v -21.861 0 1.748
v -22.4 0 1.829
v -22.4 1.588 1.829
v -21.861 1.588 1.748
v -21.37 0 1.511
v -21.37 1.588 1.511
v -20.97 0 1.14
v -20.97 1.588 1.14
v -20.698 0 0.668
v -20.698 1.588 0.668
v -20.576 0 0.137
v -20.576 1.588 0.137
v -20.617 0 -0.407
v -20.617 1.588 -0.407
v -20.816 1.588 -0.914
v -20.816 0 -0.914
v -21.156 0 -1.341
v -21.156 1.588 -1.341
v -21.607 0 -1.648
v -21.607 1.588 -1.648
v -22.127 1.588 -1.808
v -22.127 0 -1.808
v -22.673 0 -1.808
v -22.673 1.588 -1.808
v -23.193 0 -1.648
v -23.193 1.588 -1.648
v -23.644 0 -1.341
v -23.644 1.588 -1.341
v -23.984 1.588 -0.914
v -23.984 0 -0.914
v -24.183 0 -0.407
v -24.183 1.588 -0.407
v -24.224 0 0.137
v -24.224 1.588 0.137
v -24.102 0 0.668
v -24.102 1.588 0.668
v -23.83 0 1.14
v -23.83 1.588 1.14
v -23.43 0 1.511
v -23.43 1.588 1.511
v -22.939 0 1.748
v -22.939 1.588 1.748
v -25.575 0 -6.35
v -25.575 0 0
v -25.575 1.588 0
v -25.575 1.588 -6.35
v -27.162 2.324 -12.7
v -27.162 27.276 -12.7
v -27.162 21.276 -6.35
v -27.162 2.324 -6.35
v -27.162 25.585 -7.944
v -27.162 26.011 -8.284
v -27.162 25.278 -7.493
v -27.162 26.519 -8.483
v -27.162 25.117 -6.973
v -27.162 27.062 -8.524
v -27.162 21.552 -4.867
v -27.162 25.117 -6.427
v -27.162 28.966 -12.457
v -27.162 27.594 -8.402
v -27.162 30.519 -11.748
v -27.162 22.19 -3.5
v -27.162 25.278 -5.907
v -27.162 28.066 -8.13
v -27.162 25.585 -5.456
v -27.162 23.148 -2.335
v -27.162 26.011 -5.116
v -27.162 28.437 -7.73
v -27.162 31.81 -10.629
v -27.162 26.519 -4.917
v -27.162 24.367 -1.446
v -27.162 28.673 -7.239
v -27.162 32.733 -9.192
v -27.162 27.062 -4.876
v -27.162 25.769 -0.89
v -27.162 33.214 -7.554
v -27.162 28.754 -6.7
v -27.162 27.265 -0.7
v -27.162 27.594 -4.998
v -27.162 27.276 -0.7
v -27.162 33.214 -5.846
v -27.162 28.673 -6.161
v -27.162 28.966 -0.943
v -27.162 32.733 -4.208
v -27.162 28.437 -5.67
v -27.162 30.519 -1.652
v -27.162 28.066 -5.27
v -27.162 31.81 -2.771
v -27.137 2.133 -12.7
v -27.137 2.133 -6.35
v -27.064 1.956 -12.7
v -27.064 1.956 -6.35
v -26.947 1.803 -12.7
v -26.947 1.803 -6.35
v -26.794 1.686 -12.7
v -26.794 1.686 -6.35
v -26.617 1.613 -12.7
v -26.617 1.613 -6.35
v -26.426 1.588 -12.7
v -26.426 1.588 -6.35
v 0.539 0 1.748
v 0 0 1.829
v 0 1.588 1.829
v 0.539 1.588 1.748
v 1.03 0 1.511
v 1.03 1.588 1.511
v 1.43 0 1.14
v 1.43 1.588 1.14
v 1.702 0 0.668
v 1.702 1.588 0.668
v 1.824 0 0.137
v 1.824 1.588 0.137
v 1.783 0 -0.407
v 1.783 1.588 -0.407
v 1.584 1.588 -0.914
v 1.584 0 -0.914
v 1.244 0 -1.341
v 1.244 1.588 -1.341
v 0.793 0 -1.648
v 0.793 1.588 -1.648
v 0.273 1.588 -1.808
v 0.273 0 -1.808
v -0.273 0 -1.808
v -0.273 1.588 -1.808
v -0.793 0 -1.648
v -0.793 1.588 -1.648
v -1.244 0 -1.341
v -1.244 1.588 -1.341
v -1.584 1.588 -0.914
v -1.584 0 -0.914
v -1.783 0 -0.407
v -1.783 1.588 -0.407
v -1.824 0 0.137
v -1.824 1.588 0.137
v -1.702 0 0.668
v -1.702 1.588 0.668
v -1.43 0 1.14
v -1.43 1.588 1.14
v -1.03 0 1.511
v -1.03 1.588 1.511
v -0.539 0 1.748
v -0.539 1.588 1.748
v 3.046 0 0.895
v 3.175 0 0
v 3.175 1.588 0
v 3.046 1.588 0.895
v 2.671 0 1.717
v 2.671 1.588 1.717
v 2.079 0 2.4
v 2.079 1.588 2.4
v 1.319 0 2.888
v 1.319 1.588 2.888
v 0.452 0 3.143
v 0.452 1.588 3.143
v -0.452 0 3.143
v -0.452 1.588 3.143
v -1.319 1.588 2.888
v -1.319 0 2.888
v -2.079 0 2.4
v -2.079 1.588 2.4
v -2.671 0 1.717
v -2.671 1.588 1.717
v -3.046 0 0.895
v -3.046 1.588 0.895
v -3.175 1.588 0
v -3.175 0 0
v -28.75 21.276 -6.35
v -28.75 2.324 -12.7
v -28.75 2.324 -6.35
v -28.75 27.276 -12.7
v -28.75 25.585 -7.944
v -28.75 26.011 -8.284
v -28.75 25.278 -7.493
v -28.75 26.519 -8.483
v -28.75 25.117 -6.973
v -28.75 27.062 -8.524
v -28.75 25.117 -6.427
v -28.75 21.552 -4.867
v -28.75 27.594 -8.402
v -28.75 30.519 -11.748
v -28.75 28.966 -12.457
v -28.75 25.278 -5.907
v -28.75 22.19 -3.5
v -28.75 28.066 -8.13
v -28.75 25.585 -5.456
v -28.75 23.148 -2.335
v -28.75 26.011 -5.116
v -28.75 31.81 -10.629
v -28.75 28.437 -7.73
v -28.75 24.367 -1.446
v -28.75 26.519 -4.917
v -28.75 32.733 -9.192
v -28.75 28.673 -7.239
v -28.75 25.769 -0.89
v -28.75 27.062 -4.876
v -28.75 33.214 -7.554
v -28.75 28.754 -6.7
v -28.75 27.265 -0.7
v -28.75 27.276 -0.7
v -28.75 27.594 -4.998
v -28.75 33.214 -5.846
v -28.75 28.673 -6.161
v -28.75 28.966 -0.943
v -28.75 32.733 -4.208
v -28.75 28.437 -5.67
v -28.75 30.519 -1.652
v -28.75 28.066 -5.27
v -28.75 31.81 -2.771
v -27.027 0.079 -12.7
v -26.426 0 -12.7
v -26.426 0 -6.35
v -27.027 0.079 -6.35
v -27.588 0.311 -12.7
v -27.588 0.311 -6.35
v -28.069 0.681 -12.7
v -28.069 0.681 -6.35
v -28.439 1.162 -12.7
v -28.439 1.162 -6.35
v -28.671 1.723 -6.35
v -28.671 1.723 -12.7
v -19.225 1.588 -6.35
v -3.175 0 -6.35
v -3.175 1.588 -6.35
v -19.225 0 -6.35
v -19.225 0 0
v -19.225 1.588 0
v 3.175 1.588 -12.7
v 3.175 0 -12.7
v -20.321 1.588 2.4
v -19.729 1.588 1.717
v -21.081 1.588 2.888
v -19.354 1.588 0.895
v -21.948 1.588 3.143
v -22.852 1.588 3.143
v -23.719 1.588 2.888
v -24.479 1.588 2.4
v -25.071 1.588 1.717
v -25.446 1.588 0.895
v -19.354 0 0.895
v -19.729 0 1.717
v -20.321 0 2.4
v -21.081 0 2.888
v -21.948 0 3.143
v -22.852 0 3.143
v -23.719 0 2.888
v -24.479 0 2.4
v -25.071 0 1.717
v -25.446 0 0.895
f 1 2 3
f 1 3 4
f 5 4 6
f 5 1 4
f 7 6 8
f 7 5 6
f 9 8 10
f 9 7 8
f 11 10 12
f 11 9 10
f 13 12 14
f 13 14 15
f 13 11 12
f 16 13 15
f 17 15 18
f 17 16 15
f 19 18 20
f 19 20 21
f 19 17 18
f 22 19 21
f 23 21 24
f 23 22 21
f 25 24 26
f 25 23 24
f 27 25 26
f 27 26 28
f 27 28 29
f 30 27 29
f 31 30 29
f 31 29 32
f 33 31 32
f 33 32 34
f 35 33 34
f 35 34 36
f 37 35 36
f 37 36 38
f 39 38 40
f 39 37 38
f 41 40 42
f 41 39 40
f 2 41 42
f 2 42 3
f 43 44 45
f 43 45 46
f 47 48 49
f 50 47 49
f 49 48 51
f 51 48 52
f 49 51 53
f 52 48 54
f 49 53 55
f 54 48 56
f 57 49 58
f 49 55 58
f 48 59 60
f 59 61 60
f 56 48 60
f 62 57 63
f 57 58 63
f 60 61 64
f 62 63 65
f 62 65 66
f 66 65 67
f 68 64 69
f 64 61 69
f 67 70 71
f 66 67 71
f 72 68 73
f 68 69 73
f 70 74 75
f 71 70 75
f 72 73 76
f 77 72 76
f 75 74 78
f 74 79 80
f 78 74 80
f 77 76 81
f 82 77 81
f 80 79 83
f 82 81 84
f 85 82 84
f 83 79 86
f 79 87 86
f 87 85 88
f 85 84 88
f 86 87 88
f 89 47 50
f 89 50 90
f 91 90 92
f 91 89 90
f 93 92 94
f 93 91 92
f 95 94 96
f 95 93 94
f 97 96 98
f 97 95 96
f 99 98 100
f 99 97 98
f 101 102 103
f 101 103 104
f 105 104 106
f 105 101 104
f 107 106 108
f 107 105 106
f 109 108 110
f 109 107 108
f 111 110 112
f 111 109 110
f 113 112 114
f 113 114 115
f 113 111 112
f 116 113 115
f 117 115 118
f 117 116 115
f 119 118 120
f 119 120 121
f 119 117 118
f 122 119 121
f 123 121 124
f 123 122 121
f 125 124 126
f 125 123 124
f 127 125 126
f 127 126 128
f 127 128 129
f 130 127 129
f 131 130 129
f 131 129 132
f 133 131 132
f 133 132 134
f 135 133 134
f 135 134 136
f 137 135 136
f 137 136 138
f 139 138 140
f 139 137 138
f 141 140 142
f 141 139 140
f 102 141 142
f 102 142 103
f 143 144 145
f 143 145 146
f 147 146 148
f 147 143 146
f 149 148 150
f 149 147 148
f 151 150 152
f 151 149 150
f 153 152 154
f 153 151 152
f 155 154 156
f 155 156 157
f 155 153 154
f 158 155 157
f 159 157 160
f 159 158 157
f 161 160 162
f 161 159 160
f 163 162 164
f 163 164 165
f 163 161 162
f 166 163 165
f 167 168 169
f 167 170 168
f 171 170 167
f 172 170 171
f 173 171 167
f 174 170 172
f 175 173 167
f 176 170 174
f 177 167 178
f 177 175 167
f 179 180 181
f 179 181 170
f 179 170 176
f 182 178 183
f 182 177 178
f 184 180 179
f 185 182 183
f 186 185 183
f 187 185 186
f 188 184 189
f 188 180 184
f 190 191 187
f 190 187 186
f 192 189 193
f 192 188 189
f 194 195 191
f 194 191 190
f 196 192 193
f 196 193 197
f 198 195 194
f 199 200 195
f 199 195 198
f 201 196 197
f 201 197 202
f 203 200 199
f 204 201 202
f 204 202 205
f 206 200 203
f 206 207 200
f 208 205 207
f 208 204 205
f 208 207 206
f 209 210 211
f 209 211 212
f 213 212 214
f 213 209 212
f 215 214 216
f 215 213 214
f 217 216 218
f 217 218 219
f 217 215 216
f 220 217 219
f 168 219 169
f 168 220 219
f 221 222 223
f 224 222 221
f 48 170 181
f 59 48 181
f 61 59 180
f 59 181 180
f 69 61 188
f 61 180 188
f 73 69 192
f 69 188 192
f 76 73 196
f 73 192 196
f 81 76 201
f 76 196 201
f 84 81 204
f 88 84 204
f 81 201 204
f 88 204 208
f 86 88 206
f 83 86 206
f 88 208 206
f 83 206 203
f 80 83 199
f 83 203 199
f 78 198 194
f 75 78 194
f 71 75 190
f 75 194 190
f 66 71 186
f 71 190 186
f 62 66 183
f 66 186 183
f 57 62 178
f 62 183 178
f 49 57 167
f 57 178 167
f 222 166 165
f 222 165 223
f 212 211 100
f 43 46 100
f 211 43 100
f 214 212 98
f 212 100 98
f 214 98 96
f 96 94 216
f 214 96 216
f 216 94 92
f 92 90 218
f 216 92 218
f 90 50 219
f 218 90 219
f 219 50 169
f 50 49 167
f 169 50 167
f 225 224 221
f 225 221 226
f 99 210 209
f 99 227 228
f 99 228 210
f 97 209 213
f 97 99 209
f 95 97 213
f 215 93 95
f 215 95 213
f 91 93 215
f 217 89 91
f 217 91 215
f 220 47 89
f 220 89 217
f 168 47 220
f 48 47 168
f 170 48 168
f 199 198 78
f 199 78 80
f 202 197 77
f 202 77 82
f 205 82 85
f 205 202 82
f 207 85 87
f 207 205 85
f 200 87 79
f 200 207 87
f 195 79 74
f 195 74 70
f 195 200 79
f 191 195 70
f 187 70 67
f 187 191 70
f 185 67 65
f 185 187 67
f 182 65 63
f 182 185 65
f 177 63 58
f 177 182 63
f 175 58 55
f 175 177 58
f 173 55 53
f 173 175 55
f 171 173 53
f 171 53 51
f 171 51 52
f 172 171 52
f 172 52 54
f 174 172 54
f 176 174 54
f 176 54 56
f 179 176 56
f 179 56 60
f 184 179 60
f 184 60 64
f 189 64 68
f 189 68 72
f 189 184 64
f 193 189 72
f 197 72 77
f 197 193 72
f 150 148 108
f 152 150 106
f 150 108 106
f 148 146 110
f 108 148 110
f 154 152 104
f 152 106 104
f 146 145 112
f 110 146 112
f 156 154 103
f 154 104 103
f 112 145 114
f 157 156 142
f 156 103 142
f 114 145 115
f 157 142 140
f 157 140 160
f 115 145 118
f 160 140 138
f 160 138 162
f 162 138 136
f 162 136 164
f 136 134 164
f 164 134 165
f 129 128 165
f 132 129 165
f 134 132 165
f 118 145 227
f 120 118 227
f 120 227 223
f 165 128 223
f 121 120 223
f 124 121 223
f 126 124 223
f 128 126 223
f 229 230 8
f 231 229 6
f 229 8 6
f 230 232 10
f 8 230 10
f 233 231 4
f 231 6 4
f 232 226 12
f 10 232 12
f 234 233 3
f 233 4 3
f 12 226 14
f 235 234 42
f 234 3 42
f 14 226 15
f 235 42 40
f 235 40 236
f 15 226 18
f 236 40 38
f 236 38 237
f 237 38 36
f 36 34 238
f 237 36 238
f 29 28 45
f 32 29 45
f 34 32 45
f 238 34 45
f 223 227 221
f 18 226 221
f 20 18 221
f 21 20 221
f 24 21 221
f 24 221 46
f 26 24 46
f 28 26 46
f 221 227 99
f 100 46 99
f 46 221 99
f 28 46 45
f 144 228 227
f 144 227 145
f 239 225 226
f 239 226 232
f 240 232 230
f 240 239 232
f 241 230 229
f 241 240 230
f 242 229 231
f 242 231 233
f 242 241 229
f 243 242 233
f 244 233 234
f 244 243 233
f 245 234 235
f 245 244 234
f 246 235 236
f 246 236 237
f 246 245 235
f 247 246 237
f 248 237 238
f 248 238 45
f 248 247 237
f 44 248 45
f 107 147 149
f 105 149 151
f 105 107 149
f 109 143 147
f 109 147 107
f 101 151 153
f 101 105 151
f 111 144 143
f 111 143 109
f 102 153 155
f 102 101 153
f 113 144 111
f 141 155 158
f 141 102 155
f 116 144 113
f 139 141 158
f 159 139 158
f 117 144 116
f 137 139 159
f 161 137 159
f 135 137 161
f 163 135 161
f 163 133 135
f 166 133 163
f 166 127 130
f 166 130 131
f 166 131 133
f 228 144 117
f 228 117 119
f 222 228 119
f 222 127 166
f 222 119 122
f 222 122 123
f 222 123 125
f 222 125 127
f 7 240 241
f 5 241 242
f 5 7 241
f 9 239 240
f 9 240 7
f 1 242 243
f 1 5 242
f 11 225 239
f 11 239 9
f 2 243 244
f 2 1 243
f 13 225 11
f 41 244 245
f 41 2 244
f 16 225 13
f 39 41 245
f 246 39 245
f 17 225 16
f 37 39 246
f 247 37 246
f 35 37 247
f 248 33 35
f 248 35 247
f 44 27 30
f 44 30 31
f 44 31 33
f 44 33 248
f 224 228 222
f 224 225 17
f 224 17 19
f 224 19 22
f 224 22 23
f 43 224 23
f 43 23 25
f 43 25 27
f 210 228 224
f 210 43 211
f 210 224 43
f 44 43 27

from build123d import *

# Parameters (mm, degrees)
SKETCH1_R                    = 1.8288
BASE_FLANGE1_DEPTH           = 1.5875
EDGE_FLANGE2_STRIP_W         = 7.8232
EDGE_FLANGE2_STRIP_H         = 1.5875
EDGE_FLANGE2_STRIP_CUT_DEPTH = 6.35
EDGE_FLANGE2_DEPTH           = 6.35
SKETCH19_W                   = 5.65
SKETCH19_H                   = 12
TAB1_DEPTH                   = 1.5875
HOLE1_START                  = -28.75
HOLE1_OUTLINE_R              = 1.8288
HOLE1_DEPTH                  = 1.5875
FILLET1_R                    = 6


# Read off the part's stored shape, not the designer's step: Hole1
# Sheet-metal steps are written as plain solids
with BuildPart() as part:
    # Sketch1 → Base-Flange1 (new body)
    with BuildSketch(Plane(origin=(0, 0, 0), x_dir=(1, 0, 0), z_dir=(0, 1, 0))):
        with BuildLine():
            Line((-25.575, 0), (-25.575, 6.35))
            Line((-25.575, 6.35), (-27.1625, 6.35))
            Line((-27.1625, 6.35), (-27.1625, 12.7))
            Line((-27.1625, 12.7), (3.175, 12.7))
            Line((3.175, 12.7), (3.175, 6.35))
            Line((3.175, 6.35), (3.175, 0))
            ThreePointArc((3.175, 0), (0, -3.175), (-3.175, 0))
            Line((-3.175, 0), (-3.175, 6.35))
            Line((-3.175, 6.35), (-19.225, 6.35))
            Line((-19.225, 6.35), (-19.225, 0))
            ThreePointArc((-19.225, 0), (-22.4, -3.175), (-25.575, 0))
        make_face()
        with Locations(Location((0, 0, 0), (0, 0, 270))):
            Circle(SKETCH1_R, mode=Mode.SUBTRACT)
        with Locations(Location((-22.4, 0, 0), (0, 0, 270))):
            Circle(SKETCH1_R, mode=Mode.SUBTRACT)
    extrude(amount=BASE_FLANGE1_DEPTH)

    # Edge-Flange2 strip (across the edge) → Edge-Flange2 strip cut (cut)
    with BuildSketch(Plane(origin=(-27.1625, 1.5875, -12.7), x_dir=(1, 0, 0), z_dir=(0, 0, 1))):
        with Locations((-3.175, -0.79375)):
            Rectangle(EDGE_FLANGE2_STRIP_W, EDGE_FLANGE2_STRIP_H)
    extrude(amount=EDGE_FLANGE2_STRIP_CUT_DEPTH, mode=Mode.SUBTRACT)

    # Edge-Flange2 section (across the edge) → Edge-Flange2 (add)
    with BuildSketch(Plane(origin=(-27.1625, 1.5875, -12.7), x_dir=(1, 0, 0), z_dir=(0, 0, 1))):
        with BuildLine():
            Line((-1.5875, 0.7366), (-1.5875, 31.688))
            Line((-1.5875, 31.688), (0, 31.688))
            Line((0, 31.688), (0, 0.7366))
            ThreePointArc((0, 0.7366), (0.215745145, 0.215745145), (0.7366, 0))
            Line((0.7366, 0), (0.7366, -1.5875))
            ThreePointArc((0.7366, -1.5875), (-0.90678687, -0.90678687), (-1.5875, 0.7366))
        make_face()
    extrude(amount=EDGE_FLANGE2_DEPTH)

    # Sketch19 → Tab1 (add)
    with BuildSketch(Plane.ZY.offset(28.75)):
        with Locations((-3.525, 27.2755)):
            Rectangle(SKETCH19_W, SKETCH19_H)
    extrude(amount=-TAB1_DEPTH)

    # Hole1 outline → Hole1 (cut)
    with BuildSketch(Plane.YZ.offset(HOLE1_START)):
        with Locations((26.9255, -6.7)):
            Circle(HOLE1_OUTLINE_R)
    extrude(amount=HOLE1_DEPTH, mode=Mode.SUBTRACT)

    # Fillet1
    # the kernel refuses this fillet: 6 mm, written as the material it takes off along each edge
    with BuildSketch(Plane(origin=(-43.724457419, 21.2755, -0.7), x_dir=(0, 0, -1), z_dir=(1, 0, 0))) as fillet1_piece_1:
        with BuildLine():
            CenterArc((6, 5.989782968), FILLET1_R, 180, 86.655847796)
            Line((0, 5.989782968), (-0.12, 5.989782968))
            Line((-0.12, 5.989782968), (-0.12, 0))
            Line((-0.12, 0), (0, -0.12))
            ThreePointArc((0, -0.12), (2.825, -0.12), (5.643, -0.119795659))
            Line((5.643, -0.119795659), (5.65, 0))
        make_face()
    extrude(amount=31.536414838, mode=Mode.SUBTRACT)
    with BuildSketch(Plane(origin=(-43.75, 33.2755, -0.7), x_dir=(0, 0, -1), z_dir=(1, 0, 0)), Plane(origin=(-43.75, 33.2755, -12.7), x_dir=(0, -1, 0), z_dir=(1, 0, 0))) as fillet1_piece_2:
        with BuildLine():
            CenterArc((FILLET1_R, -FILLET1_R), FILLET1_R, 90, 90)
            Line((0, -FILLET1_R), (-FILLET1_R * 0.02, -FILLET1_R))
            Line((-FILLET1_R * 0.02, -FILLET1_R), (-FILLET1_R * 0.02, FILLET1_R * 0.02))
            Line((-FILLET1_R * 0.02, FILLET1_R * 0.02), (FILLET1_R, FILLET1_R * 0.02))
            Line((FILLET1_R, FILLET1_R * 0.02), (FILLET1_R, 0))
        make_face()
    extrude(amount=31.5875, mode=Mode.SUBTRACT)


solid = part.part
